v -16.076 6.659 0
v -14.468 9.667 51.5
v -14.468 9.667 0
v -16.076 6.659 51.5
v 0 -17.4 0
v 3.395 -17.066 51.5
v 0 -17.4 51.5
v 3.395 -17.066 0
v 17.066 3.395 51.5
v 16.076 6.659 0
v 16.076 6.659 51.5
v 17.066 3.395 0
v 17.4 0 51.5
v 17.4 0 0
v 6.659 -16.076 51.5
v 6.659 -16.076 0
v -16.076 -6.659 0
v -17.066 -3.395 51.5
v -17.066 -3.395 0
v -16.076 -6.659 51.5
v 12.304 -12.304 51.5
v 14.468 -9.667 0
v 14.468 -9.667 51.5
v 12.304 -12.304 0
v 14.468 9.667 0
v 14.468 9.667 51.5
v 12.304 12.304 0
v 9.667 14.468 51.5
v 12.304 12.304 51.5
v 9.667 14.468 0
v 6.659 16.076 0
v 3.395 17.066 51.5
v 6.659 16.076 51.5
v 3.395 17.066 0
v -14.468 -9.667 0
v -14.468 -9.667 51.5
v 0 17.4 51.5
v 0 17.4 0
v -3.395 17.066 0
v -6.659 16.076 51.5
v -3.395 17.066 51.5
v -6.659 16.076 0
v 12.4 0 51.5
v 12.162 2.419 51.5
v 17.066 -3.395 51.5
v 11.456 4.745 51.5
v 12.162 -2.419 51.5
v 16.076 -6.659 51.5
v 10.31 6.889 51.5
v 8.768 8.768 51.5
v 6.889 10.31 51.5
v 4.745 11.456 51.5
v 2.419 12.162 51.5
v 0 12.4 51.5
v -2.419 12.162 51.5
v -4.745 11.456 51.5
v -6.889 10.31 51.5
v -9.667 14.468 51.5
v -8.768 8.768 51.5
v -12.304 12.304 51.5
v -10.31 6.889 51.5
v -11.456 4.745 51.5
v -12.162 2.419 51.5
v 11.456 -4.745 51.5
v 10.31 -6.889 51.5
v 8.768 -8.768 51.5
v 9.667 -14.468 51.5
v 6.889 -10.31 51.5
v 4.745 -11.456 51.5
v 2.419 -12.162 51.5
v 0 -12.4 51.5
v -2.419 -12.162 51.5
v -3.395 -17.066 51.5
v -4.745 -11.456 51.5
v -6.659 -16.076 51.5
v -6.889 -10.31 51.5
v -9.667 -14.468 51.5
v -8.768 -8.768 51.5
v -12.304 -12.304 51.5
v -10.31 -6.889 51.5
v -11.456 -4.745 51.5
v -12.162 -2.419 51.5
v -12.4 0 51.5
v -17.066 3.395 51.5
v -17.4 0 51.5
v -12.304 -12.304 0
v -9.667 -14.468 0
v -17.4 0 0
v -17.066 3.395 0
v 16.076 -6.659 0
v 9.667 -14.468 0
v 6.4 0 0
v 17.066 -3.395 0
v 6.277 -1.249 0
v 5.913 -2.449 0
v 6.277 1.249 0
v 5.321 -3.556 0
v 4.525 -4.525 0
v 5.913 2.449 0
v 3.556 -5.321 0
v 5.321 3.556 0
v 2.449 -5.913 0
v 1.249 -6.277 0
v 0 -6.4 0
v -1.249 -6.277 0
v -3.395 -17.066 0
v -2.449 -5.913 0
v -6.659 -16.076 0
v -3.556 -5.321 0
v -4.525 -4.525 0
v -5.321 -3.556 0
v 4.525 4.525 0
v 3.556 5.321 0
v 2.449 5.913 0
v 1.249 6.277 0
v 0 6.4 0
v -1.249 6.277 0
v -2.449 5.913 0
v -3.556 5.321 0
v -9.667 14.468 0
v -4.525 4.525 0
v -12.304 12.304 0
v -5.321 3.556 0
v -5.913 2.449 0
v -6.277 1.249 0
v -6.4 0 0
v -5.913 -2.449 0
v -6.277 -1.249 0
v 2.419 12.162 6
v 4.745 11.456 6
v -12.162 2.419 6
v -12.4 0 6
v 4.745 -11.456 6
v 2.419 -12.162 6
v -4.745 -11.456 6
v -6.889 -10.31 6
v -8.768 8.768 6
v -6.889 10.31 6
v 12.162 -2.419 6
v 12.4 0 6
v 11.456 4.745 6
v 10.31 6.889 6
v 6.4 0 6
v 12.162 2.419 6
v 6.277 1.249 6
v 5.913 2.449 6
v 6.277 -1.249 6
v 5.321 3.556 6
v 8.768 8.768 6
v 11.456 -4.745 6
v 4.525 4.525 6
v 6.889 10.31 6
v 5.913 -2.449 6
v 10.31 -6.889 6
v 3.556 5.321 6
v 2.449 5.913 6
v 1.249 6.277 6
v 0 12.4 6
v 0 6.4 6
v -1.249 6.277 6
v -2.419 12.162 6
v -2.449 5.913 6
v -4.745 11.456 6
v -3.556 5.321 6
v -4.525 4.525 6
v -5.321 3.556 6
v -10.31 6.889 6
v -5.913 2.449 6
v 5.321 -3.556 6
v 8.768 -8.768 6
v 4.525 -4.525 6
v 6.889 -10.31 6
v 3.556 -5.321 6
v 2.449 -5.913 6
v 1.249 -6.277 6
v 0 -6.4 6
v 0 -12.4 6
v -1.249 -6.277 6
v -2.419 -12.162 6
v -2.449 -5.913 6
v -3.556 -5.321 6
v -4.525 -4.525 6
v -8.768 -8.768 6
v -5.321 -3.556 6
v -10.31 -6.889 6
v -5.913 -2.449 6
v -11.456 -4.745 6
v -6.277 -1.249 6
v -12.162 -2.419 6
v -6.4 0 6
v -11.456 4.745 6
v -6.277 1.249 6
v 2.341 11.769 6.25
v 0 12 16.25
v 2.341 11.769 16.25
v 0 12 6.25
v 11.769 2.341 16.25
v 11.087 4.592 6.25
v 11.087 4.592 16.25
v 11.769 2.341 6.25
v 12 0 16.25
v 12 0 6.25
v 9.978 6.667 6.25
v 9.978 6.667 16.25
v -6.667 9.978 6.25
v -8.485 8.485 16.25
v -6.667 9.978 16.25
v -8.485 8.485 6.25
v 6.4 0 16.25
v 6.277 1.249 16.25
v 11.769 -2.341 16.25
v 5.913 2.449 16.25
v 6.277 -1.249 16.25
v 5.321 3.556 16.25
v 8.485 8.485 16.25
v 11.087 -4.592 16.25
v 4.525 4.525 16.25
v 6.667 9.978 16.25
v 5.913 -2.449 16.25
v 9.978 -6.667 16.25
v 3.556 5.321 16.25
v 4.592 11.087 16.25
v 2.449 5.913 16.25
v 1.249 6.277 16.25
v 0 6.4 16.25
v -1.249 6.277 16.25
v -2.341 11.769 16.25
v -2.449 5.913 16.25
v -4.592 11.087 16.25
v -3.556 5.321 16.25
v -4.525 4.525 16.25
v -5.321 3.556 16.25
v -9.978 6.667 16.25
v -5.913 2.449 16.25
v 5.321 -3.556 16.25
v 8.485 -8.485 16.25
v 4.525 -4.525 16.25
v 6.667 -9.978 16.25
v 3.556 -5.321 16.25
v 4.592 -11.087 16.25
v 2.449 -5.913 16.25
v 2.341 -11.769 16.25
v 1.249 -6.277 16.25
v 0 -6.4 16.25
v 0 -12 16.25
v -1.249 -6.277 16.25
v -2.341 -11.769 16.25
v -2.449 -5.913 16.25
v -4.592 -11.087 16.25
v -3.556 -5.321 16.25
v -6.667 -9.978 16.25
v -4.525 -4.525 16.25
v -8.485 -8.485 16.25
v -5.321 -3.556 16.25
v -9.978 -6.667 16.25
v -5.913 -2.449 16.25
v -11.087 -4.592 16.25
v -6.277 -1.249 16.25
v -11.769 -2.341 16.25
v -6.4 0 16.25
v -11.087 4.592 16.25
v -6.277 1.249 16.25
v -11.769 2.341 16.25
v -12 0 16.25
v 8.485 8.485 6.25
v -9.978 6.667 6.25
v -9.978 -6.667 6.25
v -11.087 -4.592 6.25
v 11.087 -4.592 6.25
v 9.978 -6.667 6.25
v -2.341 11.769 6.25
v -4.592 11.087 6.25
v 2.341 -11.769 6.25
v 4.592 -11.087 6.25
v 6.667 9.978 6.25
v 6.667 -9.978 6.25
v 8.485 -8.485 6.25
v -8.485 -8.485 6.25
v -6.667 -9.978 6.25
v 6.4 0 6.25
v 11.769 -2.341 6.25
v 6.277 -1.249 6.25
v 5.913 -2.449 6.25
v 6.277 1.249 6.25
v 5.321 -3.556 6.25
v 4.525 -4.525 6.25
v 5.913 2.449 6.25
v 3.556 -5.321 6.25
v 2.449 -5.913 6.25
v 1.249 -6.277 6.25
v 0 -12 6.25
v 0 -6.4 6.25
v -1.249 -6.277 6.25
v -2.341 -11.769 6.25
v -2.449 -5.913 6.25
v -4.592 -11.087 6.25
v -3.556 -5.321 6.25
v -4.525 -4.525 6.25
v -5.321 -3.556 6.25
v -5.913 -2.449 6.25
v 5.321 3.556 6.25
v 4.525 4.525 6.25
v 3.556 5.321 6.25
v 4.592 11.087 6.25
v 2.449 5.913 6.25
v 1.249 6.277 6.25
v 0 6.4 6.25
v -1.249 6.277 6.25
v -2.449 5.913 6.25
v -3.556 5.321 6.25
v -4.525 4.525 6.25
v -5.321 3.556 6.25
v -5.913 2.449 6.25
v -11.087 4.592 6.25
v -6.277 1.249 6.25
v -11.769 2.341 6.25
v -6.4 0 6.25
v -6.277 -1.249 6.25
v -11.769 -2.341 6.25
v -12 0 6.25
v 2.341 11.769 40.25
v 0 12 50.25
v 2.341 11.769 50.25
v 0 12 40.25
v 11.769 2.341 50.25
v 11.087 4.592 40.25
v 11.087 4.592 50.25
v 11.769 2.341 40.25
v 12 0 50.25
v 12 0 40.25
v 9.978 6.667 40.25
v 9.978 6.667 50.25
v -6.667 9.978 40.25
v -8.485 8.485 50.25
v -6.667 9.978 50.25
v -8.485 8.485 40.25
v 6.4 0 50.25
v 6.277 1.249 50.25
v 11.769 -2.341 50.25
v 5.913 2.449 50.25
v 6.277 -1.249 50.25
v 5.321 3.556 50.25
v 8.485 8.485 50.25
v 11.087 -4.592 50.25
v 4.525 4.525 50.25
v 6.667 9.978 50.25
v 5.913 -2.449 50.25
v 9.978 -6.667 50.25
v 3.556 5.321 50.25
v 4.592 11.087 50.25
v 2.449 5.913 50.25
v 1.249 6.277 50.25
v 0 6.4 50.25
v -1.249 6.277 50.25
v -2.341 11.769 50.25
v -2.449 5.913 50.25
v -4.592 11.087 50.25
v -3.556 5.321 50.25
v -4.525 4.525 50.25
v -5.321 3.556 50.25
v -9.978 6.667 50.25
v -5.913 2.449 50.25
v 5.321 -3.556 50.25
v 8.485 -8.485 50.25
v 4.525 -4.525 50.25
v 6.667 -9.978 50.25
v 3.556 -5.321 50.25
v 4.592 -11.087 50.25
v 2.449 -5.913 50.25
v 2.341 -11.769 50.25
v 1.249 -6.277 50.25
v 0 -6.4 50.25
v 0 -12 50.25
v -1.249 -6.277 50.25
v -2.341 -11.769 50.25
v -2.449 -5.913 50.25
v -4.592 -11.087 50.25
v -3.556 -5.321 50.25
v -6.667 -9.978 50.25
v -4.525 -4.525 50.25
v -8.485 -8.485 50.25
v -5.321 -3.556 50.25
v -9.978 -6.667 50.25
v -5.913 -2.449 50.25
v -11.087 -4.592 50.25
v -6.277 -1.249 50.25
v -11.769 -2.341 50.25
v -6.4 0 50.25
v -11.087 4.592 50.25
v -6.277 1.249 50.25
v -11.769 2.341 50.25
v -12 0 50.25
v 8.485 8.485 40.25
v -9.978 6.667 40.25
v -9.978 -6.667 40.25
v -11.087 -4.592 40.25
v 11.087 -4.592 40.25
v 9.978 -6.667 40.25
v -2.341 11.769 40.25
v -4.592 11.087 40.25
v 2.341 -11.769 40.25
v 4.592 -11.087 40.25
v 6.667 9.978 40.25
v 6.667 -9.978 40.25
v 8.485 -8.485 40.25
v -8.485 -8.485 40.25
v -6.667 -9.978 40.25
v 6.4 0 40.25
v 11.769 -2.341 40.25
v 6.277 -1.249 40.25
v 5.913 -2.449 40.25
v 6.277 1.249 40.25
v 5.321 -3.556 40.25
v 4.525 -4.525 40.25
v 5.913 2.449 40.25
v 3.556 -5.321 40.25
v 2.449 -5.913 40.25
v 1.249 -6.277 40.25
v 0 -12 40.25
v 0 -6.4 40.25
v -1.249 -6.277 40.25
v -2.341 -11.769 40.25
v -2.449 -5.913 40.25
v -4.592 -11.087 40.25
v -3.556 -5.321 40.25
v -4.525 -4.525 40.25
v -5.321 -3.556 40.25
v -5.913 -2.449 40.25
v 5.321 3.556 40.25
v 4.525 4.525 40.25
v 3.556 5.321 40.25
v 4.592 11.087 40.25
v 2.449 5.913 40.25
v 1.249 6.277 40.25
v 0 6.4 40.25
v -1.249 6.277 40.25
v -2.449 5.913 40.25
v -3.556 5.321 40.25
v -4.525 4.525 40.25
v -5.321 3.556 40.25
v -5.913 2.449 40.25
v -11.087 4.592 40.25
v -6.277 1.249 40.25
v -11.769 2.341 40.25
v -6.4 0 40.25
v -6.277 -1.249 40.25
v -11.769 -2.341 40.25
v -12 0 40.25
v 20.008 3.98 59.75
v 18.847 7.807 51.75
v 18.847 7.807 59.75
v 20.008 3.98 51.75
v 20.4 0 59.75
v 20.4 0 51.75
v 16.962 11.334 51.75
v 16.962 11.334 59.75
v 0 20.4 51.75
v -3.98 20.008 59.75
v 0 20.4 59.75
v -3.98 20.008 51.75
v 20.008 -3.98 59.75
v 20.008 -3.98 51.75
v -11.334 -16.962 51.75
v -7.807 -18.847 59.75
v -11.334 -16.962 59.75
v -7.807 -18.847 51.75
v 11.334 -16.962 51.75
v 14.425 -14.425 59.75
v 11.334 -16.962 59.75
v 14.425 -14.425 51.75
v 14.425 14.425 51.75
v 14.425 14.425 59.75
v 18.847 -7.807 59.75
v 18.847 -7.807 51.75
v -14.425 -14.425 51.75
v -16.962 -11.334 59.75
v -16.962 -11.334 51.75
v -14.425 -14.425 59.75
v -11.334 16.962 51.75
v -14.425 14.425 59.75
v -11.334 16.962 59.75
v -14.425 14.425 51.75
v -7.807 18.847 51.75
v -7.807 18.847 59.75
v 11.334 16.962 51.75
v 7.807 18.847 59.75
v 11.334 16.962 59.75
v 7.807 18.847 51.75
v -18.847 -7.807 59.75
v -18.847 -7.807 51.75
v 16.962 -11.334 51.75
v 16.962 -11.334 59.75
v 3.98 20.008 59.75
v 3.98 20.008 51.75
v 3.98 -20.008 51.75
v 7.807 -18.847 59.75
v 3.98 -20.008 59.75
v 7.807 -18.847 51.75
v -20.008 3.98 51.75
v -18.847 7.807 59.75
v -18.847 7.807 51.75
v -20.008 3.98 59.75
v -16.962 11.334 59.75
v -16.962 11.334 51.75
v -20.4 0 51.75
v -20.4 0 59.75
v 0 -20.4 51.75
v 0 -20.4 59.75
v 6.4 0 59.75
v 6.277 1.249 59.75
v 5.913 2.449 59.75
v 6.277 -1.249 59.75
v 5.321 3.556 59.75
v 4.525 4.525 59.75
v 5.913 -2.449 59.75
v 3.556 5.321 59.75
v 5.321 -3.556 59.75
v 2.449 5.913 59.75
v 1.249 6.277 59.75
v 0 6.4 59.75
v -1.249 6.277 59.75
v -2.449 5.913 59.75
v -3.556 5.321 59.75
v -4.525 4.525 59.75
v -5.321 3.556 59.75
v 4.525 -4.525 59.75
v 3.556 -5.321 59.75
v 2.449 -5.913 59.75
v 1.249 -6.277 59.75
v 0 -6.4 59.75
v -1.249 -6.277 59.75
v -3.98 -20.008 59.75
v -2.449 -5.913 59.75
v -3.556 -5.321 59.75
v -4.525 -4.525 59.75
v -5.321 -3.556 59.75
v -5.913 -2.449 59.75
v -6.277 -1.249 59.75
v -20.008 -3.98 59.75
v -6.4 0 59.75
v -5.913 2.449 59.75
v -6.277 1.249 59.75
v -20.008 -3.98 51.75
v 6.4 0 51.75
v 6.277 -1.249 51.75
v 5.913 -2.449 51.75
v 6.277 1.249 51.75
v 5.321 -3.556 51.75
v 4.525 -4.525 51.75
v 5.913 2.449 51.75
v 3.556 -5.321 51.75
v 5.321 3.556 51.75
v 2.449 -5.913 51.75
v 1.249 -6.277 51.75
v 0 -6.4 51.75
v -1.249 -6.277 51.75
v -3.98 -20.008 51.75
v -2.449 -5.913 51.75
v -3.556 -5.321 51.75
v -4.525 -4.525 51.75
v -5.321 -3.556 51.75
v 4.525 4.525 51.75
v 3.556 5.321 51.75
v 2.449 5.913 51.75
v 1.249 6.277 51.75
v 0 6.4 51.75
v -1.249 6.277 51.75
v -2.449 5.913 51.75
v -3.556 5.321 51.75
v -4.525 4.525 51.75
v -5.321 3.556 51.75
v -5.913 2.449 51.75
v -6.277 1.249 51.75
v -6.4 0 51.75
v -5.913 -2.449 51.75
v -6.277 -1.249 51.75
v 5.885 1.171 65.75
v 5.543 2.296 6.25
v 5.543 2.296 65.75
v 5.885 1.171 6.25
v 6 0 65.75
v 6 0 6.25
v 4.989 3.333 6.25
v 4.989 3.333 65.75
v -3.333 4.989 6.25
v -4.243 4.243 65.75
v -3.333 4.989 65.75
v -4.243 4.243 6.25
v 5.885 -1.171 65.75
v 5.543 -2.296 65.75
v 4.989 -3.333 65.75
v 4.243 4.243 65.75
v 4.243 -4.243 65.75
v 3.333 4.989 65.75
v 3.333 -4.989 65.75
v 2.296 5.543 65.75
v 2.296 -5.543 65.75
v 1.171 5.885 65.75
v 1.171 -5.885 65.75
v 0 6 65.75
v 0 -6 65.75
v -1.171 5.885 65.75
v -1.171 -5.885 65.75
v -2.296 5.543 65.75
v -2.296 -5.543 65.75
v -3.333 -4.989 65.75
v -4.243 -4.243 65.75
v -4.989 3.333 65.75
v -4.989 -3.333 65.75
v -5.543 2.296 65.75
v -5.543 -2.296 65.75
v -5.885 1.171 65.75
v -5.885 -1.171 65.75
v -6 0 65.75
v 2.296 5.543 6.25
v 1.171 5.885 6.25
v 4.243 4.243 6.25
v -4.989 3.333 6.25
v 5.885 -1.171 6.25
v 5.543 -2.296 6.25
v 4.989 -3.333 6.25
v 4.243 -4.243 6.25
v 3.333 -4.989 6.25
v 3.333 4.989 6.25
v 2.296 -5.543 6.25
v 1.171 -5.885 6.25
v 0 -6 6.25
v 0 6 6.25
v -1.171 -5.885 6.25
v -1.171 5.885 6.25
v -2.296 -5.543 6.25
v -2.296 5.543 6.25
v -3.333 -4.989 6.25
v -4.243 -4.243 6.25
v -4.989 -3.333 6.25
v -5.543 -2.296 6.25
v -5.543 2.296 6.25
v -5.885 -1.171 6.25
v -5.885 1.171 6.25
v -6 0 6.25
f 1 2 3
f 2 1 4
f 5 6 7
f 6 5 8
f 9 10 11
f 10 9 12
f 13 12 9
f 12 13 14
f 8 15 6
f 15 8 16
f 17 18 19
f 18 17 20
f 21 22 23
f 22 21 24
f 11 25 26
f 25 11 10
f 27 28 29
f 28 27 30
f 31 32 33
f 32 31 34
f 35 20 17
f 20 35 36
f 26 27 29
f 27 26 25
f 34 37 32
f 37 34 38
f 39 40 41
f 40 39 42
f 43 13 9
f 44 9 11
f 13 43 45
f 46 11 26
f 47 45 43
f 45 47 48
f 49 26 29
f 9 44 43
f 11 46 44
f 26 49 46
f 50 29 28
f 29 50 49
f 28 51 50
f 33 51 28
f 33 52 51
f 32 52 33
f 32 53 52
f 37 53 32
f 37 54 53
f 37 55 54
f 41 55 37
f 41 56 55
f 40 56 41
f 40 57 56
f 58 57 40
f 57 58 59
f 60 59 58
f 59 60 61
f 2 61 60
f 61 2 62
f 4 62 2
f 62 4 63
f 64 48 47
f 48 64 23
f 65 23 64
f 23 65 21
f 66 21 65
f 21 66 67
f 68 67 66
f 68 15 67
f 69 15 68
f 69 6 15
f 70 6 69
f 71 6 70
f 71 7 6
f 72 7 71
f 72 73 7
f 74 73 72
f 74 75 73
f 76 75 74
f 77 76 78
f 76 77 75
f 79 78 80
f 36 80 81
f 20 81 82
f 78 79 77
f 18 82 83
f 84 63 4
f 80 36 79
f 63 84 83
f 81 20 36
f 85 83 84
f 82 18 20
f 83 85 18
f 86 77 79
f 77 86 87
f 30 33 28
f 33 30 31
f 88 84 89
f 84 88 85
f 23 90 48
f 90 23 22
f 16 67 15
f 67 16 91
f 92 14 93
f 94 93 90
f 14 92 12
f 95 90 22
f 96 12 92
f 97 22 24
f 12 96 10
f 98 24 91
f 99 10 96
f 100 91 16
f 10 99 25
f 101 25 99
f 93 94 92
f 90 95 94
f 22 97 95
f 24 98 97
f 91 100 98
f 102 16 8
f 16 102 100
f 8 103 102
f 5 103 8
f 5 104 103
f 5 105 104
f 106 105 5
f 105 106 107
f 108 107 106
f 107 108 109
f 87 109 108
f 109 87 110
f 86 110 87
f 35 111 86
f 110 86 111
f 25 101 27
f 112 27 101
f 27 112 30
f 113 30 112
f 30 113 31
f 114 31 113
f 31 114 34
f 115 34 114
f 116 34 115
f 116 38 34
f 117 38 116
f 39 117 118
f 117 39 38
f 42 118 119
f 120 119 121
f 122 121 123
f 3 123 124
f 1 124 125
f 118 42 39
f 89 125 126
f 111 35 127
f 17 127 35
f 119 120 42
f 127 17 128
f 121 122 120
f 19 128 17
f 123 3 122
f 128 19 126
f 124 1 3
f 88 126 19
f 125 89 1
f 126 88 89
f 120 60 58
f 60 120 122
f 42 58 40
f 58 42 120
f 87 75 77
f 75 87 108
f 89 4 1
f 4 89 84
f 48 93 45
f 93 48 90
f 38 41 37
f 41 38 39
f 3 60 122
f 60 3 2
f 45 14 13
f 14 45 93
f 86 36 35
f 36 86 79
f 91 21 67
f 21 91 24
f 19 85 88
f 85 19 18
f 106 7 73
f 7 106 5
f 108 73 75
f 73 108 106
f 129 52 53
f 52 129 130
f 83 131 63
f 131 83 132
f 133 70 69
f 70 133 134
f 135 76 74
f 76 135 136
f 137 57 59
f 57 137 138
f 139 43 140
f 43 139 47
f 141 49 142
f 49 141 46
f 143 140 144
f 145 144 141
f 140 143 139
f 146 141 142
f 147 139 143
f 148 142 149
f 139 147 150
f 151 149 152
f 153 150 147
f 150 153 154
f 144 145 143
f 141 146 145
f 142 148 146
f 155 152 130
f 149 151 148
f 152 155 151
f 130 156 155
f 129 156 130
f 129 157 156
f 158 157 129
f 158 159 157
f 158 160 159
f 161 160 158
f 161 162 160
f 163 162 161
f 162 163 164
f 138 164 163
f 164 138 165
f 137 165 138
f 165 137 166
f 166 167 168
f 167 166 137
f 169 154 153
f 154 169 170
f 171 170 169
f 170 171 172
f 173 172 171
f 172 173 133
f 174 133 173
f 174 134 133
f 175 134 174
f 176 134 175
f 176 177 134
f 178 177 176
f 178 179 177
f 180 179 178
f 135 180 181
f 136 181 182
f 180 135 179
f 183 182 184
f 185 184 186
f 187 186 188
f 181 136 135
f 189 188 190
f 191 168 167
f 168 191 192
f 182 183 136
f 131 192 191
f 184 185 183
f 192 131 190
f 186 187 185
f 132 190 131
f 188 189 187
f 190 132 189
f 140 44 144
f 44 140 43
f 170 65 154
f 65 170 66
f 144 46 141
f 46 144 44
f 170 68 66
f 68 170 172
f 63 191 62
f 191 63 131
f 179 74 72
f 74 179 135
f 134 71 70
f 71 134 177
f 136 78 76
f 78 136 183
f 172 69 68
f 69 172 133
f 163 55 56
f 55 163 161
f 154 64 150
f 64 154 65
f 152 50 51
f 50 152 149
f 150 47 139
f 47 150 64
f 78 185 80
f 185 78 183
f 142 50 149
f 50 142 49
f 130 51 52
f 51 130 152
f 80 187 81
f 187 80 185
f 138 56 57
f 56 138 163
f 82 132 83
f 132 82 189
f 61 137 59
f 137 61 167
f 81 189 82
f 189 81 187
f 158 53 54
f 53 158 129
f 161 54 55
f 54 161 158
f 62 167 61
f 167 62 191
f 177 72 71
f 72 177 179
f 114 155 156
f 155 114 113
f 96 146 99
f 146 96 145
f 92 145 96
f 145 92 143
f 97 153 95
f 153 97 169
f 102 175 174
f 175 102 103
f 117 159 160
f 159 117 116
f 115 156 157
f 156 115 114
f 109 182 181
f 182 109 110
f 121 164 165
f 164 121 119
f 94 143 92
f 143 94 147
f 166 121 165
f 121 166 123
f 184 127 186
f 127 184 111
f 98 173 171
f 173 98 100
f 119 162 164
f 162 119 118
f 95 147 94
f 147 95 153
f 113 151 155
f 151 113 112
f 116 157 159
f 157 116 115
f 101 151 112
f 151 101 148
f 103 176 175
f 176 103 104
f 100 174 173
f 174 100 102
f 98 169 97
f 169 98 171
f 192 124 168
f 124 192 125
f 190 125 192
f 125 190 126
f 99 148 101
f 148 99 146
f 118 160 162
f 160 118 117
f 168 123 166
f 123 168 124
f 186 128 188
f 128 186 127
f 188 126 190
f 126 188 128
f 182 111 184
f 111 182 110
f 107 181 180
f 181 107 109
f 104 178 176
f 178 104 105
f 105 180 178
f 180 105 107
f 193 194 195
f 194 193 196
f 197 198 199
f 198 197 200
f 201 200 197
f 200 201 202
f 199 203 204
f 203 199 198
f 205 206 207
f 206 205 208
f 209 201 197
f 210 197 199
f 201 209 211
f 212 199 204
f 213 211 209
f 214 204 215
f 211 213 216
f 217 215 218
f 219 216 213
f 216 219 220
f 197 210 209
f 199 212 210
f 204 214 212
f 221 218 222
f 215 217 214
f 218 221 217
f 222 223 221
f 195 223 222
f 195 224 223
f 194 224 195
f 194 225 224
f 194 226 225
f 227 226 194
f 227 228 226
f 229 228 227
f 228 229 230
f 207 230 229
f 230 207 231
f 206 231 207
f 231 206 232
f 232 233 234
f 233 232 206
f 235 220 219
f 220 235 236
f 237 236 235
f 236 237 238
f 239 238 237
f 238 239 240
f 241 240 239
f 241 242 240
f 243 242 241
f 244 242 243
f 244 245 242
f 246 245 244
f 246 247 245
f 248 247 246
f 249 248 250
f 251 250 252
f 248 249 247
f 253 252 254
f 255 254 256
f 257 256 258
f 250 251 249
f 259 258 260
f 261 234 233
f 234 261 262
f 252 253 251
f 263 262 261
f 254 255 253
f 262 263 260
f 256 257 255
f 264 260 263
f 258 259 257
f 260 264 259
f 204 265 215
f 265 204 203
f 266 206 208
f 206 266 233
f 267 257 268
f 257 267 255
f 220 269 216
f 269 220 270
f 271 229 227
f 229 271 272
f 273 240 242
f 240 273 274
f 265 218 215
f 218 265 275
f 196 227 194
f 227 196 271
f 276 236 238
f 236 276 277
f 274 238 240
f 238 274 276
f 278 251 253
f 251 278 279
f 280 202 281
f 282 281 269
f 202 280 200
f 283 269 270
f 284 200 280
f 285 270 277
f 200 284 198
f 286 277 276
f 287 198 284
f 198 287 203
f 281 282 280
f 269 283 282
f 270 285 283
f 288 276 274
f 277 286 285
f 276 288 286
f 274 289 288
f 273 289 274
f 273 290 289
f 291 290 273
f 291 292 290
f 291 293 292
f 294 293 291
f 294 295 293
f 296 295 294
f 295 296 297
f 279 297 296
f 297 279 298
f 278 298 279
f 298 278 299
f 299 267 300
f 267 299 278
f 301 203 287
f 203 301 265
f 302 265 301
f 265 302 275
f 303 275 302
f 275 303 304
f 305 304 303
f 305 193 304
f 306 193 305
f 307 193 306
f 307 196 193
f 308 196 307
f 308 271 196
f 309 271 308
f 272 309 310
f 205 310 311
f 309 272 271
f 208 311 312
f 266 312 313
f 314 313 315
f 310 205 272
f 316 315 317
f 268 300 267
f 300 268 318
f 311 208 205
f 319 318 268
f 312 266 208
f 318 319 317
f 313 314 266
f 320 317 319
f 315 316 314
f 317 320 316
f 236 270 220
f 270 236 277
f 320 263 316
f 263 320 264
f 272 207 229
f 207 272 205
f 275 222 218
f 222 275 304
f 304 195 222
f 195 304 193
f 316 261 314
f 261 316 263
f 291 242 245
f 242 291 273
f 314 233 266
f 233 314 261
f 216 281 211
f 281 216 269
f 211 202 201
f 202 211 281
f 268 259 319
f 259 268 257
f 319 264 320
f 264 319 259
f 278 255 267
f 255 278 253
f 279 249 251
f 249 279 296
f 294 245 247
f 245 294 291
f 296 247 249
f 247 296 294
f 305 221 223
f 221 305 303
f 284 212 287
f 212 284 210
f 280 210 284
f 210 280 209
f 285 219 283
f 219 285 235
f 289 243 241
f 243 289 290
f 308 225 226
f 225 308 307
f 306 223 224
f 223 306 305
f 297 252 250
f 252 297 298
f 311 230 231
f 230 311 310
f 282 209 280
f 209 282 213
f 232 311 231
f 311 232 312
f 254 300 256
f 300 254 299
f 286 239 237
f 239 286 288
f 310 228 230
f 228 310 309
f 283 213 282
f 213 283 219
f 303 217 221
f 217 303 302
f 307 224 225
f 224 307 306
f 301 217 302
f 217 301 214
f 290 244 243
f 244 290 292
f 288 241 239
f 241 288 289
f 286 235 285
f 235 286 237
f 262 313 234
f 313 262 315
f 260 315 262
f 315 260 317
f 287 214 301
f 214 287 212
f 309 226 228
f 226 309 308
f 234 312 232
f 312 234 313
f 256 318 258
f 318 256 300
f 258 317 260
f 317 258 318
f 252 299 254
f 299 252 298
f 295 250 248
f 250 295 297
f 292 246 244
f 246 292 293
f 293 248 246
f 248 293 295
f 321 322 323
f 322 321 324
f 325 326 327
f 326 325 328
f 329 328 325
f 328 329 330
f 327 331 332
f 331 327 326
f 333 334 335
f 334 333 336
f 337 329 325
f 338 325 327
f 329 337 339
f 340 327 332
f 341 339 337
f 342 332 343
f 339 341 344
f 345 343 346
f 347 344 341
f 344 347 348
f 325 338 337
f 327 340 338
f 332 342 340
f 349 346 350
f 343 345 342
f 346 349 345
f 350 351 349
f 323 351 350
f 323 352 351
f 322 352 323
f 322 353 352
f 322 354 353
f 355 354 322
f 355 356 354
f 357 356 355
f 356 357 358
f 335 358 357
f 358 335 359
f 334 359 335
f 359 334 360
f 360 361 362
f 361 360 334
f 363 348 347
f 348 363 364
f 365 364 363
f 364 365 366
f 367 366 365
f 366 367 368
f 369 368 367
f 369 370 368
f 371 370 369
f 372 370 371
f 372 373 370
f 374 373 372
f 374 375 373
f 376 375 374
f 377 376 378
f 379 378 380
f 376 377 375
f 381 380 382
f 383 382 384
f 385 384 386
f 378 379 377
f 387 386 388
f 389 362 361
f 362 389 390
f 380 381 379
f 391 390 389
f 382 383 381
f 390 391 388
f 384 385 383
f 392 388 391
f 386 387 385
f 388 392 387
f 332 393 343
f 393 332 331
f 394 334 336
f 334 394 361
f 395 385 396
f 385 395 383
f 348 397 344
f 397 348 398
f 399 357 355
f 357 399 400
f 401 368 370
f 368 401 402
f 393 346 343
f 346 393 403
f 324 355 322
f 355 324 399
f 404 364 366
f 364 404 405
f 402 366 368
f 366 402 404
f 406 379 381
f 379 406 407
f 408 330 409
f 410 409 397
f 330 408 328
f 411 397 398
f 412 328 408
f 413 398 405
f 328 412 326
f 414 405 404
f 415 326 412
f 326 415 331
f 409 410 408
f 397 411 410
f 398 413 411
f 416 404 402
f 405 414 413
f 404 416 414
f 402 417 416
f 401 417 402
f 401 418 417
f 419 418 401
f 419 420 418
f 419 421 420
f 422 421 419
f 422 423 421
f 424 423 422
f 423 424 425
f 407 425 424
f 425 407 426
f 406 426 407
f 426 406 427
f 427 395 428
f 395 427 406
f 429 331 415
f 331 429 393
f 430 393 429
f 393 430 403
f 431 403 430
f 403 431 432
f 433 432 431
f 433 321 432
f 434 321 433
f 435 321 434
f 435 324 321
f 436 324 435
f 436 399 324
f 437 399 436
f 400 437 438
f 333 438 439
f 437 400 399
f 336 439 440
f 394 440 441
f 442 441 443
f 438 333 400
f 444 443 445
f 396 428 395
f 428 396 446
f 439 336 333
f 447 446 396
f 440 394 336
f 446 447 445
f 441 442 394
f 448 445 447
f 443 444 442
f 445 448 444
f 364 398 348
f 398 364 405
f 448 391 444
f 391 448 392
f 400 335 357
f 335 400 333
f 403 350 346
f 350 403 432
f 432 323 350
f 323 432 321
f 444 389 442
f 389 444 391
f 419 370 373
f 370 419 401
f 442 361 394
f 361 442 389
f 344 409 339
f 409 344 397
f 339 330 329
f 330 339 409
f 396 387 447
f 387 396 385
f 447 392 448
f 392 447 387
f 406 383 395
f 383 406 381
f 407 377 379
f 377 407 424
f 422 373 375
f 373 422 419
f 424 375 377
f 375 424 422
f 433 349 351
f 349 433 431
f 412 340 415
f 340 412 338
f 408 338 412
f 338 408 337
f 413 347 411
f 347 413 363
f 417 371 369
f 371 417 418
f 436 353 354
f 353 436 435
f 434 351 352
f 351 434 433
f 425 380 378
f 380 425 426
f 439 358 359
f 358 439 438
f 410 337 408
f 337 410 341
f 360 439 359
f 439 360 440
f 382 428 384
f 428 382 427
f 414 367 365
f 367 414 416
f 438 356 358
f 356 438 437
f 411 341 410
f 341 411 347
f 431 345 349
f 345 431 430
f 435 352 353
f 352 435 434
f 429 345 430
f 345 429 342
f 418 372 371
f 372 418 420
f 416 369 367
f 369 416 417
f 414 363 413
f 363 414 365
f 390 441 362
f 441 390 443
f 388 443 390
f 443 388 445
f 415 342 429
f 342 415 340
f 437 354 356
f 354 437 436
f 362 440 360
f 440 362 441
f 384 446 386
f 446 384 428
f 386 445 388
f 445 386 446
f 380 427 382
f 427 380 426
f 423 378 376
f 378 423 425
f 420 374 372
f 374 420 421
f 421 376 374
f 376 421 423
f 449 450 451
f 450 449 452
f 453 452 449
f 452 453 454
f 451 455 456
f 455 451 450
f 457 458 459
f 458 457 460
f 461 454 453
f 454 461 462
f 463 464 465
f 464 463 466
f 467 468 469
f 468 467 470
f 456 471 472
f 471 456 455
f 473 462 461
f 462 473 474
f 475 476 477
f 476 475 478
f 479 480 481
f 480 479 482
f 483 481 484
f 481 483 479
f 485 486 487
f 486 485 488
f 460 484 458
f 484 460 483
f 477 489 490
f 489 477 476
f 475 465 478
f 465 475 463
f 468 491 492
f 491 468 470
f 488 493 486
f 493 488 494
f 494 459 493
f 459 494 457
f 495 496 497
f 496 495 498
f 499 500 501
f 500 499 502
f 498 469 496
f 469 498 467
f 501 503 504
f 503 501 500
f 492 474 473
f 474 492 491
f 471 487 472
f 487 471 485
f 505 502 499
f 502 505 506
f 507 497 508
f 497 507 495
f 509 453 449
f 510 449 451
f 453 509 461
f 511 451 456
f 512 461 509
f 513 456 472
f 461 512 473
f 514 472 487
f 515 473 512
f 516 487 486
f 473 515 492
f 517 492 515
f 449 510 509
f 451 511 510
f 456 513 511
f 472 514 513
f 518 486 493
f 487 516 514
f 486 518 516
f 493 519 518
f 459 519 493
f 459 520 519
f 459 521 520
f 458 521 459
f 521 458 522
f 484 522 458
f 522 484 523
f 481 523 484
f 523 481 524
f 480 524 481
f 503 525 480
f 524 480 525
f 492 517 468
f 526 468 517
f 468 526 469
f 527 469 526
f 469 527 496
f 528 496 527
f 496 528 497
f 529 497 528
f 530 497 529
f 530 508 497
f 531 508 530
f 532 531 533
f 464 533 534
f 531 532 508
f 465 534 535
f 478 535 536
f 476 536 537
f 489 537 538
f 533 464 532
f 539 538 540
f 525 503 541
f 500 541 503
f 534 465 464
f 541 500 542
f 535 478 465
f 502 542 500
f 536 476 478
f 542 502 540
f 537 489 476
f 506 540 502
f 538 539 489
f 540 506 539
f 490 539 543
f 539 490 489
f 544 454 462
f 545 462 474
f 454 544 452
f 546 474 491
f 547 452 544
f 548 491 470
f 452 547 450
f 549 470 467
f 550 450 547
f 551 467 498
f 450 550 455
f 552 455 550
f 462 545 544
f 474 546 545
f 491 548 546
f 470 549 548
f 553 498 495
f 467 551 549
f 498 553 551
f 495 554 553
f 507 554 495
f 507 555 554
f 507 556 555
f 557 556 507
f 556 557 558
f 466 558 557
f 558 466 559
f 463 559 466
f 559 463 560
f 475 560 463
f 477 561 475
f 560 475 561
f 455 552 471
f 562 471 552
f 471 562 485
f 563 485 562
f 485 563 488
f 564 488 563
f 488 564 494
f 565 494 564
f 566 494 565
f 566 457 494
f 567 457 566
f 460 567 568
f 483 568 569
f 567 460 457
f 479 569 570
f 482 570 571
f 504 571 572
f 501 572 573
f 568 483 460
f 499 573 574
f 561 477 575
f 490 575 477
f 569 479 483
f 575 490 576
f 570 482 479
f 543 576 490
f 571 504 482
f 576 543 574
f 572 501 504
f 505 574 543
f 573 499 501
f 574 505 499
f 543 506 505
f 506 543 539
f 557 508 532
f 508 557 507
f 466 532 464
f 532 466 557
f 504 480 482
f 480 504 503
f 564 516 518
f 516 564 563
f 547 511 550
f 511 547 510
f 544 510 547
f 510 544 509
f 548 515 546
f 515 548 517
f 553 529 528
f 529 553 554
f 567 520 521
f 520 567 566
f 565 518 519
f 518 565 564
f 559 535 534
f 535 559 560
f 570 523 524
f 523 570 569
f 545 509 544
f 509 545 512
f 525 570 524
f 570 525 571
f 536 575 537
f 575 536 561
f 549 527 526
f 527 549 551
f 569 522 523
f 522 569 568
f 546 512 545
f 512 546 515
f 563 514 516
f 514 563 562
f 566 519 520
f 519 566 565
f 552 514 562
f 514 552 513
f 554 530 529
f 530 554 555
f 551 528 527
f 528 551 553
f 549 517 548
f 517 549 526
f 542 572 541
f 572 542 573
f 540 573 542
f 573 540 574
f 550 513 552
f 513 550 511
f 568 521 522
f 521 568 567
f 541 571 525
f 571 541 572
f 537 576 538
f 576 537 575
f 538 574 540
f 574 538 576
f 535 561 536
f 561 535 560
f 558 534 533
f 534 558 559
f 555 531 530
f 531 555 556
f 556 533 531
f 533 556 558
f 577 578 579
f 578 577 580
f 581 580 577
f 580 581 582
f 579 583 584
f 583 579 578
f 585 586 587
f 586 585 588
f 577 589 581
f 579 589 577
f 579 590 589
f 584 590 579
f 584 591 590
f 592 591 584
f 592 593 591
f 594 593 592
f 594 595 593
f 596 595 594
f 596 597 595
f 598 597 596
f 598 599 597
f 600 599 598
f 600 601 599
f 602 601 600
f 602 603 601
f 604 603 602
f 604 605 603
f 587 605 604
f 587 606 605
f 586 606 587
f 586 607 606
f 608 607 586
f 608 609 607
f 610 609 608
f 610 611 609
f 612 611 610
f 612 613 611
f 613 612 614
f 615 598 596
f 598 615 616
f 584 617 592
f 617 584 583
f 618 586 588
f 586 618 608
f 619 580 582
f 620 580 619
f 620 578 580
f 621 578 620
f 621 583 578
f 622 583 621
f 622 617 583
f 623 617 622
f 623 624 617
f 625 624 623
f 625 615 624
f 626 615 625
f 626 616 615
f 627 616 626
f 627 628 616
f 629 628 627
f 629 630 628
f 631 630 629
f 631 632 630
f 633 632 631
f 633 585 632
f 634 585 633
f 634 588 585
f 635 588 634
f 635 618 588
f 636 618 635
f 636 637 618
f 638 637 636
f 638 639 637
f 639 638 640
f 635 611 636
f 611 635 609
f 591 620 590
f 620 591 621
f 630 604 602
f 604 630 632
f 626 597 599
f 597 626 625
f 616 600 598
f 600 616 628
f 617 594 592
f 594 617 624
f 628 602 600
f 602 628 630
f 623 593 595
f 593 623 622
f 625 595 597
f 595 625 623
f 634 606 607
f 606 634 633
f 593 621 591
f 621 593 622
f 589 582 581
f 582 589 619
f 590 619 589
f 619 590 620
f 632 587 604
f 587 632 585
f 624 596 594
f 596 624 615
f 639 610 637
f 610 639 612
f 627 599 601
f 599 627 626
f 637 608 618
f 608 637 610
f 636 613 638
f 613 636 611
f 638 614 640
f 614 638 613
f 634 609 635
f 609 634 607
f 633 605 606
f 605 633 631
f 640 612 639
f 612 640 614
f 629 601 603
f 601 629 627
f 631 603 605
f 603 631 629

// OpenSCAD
$fn = 32;

// ------------------------------------------------------------------------
// Shaft station: cup d34.8 x 51.5 mm, shaft d12
// Every part is its own module, assembly() places every instance.
// ------------------------------------------------------------------------

// --- part 1 ---
module housing_cup() {
  difference() {
    cylinder(h = 51.5, d = 34.8);
    translate([0, 0, 6]) cylinder(h = 46.5, d = 24.8);
    translate([0, 0, -1]) cylinder(h = 8, d = 12.8);
  }
}

// --- part 2 ---
module bearing_lower() {
  difference() {
      translate([0, 0, 0]) cylinder(h = 10, d = 24);
      translate([0, 0, -1]) cylinder(h = 12, d = 12.8);
    }
}

// --- part 3 ---
module bearing_upper() {
  difference() {
      translate([0, 0, 0]) cylinder(h = 10, d = 24);
      translate([0, 0, -1]) cylinder(h = 12, d = 12.8);
    }
}

// --- part 4 ---
module station_shaft() {
  translate([0, 0, -29.75]) cylinder(h = 59.5, d = 12);
}

// --- part 5 ---
module station_cover() {
  difference() {
    cylinder(h = 8, d = 40.8);
    translate([0, 0, -1]) cylinder(h = 10, d = 12.8);
  }
}

// --- assembly ---
module assembly() {
  color([0.80, 0.24, 0.20]) translate([0, 0, 0]) rotate([0, 0, 0]) housing_cup();
  color([0.20, 0.45, 0.75]) translate([0, 0, 6.25]) rotate([0, 0, 0]) bearing_lower();
  color([0.25, 0.62, 0.32]) translate([0, 0, 40.25]) rotate([0, 0, 0]) bearing_upper();
  color([0.92, 0.70, 0.18]) translate([0, 0, 36]) rotate([0, 0, 0]) station_shaft();
  color([0.58, 0.35, 0.70]) translate([0, 0, 51.75]) rotate([0, 0, 0]) station_cover();
}

assembly();
